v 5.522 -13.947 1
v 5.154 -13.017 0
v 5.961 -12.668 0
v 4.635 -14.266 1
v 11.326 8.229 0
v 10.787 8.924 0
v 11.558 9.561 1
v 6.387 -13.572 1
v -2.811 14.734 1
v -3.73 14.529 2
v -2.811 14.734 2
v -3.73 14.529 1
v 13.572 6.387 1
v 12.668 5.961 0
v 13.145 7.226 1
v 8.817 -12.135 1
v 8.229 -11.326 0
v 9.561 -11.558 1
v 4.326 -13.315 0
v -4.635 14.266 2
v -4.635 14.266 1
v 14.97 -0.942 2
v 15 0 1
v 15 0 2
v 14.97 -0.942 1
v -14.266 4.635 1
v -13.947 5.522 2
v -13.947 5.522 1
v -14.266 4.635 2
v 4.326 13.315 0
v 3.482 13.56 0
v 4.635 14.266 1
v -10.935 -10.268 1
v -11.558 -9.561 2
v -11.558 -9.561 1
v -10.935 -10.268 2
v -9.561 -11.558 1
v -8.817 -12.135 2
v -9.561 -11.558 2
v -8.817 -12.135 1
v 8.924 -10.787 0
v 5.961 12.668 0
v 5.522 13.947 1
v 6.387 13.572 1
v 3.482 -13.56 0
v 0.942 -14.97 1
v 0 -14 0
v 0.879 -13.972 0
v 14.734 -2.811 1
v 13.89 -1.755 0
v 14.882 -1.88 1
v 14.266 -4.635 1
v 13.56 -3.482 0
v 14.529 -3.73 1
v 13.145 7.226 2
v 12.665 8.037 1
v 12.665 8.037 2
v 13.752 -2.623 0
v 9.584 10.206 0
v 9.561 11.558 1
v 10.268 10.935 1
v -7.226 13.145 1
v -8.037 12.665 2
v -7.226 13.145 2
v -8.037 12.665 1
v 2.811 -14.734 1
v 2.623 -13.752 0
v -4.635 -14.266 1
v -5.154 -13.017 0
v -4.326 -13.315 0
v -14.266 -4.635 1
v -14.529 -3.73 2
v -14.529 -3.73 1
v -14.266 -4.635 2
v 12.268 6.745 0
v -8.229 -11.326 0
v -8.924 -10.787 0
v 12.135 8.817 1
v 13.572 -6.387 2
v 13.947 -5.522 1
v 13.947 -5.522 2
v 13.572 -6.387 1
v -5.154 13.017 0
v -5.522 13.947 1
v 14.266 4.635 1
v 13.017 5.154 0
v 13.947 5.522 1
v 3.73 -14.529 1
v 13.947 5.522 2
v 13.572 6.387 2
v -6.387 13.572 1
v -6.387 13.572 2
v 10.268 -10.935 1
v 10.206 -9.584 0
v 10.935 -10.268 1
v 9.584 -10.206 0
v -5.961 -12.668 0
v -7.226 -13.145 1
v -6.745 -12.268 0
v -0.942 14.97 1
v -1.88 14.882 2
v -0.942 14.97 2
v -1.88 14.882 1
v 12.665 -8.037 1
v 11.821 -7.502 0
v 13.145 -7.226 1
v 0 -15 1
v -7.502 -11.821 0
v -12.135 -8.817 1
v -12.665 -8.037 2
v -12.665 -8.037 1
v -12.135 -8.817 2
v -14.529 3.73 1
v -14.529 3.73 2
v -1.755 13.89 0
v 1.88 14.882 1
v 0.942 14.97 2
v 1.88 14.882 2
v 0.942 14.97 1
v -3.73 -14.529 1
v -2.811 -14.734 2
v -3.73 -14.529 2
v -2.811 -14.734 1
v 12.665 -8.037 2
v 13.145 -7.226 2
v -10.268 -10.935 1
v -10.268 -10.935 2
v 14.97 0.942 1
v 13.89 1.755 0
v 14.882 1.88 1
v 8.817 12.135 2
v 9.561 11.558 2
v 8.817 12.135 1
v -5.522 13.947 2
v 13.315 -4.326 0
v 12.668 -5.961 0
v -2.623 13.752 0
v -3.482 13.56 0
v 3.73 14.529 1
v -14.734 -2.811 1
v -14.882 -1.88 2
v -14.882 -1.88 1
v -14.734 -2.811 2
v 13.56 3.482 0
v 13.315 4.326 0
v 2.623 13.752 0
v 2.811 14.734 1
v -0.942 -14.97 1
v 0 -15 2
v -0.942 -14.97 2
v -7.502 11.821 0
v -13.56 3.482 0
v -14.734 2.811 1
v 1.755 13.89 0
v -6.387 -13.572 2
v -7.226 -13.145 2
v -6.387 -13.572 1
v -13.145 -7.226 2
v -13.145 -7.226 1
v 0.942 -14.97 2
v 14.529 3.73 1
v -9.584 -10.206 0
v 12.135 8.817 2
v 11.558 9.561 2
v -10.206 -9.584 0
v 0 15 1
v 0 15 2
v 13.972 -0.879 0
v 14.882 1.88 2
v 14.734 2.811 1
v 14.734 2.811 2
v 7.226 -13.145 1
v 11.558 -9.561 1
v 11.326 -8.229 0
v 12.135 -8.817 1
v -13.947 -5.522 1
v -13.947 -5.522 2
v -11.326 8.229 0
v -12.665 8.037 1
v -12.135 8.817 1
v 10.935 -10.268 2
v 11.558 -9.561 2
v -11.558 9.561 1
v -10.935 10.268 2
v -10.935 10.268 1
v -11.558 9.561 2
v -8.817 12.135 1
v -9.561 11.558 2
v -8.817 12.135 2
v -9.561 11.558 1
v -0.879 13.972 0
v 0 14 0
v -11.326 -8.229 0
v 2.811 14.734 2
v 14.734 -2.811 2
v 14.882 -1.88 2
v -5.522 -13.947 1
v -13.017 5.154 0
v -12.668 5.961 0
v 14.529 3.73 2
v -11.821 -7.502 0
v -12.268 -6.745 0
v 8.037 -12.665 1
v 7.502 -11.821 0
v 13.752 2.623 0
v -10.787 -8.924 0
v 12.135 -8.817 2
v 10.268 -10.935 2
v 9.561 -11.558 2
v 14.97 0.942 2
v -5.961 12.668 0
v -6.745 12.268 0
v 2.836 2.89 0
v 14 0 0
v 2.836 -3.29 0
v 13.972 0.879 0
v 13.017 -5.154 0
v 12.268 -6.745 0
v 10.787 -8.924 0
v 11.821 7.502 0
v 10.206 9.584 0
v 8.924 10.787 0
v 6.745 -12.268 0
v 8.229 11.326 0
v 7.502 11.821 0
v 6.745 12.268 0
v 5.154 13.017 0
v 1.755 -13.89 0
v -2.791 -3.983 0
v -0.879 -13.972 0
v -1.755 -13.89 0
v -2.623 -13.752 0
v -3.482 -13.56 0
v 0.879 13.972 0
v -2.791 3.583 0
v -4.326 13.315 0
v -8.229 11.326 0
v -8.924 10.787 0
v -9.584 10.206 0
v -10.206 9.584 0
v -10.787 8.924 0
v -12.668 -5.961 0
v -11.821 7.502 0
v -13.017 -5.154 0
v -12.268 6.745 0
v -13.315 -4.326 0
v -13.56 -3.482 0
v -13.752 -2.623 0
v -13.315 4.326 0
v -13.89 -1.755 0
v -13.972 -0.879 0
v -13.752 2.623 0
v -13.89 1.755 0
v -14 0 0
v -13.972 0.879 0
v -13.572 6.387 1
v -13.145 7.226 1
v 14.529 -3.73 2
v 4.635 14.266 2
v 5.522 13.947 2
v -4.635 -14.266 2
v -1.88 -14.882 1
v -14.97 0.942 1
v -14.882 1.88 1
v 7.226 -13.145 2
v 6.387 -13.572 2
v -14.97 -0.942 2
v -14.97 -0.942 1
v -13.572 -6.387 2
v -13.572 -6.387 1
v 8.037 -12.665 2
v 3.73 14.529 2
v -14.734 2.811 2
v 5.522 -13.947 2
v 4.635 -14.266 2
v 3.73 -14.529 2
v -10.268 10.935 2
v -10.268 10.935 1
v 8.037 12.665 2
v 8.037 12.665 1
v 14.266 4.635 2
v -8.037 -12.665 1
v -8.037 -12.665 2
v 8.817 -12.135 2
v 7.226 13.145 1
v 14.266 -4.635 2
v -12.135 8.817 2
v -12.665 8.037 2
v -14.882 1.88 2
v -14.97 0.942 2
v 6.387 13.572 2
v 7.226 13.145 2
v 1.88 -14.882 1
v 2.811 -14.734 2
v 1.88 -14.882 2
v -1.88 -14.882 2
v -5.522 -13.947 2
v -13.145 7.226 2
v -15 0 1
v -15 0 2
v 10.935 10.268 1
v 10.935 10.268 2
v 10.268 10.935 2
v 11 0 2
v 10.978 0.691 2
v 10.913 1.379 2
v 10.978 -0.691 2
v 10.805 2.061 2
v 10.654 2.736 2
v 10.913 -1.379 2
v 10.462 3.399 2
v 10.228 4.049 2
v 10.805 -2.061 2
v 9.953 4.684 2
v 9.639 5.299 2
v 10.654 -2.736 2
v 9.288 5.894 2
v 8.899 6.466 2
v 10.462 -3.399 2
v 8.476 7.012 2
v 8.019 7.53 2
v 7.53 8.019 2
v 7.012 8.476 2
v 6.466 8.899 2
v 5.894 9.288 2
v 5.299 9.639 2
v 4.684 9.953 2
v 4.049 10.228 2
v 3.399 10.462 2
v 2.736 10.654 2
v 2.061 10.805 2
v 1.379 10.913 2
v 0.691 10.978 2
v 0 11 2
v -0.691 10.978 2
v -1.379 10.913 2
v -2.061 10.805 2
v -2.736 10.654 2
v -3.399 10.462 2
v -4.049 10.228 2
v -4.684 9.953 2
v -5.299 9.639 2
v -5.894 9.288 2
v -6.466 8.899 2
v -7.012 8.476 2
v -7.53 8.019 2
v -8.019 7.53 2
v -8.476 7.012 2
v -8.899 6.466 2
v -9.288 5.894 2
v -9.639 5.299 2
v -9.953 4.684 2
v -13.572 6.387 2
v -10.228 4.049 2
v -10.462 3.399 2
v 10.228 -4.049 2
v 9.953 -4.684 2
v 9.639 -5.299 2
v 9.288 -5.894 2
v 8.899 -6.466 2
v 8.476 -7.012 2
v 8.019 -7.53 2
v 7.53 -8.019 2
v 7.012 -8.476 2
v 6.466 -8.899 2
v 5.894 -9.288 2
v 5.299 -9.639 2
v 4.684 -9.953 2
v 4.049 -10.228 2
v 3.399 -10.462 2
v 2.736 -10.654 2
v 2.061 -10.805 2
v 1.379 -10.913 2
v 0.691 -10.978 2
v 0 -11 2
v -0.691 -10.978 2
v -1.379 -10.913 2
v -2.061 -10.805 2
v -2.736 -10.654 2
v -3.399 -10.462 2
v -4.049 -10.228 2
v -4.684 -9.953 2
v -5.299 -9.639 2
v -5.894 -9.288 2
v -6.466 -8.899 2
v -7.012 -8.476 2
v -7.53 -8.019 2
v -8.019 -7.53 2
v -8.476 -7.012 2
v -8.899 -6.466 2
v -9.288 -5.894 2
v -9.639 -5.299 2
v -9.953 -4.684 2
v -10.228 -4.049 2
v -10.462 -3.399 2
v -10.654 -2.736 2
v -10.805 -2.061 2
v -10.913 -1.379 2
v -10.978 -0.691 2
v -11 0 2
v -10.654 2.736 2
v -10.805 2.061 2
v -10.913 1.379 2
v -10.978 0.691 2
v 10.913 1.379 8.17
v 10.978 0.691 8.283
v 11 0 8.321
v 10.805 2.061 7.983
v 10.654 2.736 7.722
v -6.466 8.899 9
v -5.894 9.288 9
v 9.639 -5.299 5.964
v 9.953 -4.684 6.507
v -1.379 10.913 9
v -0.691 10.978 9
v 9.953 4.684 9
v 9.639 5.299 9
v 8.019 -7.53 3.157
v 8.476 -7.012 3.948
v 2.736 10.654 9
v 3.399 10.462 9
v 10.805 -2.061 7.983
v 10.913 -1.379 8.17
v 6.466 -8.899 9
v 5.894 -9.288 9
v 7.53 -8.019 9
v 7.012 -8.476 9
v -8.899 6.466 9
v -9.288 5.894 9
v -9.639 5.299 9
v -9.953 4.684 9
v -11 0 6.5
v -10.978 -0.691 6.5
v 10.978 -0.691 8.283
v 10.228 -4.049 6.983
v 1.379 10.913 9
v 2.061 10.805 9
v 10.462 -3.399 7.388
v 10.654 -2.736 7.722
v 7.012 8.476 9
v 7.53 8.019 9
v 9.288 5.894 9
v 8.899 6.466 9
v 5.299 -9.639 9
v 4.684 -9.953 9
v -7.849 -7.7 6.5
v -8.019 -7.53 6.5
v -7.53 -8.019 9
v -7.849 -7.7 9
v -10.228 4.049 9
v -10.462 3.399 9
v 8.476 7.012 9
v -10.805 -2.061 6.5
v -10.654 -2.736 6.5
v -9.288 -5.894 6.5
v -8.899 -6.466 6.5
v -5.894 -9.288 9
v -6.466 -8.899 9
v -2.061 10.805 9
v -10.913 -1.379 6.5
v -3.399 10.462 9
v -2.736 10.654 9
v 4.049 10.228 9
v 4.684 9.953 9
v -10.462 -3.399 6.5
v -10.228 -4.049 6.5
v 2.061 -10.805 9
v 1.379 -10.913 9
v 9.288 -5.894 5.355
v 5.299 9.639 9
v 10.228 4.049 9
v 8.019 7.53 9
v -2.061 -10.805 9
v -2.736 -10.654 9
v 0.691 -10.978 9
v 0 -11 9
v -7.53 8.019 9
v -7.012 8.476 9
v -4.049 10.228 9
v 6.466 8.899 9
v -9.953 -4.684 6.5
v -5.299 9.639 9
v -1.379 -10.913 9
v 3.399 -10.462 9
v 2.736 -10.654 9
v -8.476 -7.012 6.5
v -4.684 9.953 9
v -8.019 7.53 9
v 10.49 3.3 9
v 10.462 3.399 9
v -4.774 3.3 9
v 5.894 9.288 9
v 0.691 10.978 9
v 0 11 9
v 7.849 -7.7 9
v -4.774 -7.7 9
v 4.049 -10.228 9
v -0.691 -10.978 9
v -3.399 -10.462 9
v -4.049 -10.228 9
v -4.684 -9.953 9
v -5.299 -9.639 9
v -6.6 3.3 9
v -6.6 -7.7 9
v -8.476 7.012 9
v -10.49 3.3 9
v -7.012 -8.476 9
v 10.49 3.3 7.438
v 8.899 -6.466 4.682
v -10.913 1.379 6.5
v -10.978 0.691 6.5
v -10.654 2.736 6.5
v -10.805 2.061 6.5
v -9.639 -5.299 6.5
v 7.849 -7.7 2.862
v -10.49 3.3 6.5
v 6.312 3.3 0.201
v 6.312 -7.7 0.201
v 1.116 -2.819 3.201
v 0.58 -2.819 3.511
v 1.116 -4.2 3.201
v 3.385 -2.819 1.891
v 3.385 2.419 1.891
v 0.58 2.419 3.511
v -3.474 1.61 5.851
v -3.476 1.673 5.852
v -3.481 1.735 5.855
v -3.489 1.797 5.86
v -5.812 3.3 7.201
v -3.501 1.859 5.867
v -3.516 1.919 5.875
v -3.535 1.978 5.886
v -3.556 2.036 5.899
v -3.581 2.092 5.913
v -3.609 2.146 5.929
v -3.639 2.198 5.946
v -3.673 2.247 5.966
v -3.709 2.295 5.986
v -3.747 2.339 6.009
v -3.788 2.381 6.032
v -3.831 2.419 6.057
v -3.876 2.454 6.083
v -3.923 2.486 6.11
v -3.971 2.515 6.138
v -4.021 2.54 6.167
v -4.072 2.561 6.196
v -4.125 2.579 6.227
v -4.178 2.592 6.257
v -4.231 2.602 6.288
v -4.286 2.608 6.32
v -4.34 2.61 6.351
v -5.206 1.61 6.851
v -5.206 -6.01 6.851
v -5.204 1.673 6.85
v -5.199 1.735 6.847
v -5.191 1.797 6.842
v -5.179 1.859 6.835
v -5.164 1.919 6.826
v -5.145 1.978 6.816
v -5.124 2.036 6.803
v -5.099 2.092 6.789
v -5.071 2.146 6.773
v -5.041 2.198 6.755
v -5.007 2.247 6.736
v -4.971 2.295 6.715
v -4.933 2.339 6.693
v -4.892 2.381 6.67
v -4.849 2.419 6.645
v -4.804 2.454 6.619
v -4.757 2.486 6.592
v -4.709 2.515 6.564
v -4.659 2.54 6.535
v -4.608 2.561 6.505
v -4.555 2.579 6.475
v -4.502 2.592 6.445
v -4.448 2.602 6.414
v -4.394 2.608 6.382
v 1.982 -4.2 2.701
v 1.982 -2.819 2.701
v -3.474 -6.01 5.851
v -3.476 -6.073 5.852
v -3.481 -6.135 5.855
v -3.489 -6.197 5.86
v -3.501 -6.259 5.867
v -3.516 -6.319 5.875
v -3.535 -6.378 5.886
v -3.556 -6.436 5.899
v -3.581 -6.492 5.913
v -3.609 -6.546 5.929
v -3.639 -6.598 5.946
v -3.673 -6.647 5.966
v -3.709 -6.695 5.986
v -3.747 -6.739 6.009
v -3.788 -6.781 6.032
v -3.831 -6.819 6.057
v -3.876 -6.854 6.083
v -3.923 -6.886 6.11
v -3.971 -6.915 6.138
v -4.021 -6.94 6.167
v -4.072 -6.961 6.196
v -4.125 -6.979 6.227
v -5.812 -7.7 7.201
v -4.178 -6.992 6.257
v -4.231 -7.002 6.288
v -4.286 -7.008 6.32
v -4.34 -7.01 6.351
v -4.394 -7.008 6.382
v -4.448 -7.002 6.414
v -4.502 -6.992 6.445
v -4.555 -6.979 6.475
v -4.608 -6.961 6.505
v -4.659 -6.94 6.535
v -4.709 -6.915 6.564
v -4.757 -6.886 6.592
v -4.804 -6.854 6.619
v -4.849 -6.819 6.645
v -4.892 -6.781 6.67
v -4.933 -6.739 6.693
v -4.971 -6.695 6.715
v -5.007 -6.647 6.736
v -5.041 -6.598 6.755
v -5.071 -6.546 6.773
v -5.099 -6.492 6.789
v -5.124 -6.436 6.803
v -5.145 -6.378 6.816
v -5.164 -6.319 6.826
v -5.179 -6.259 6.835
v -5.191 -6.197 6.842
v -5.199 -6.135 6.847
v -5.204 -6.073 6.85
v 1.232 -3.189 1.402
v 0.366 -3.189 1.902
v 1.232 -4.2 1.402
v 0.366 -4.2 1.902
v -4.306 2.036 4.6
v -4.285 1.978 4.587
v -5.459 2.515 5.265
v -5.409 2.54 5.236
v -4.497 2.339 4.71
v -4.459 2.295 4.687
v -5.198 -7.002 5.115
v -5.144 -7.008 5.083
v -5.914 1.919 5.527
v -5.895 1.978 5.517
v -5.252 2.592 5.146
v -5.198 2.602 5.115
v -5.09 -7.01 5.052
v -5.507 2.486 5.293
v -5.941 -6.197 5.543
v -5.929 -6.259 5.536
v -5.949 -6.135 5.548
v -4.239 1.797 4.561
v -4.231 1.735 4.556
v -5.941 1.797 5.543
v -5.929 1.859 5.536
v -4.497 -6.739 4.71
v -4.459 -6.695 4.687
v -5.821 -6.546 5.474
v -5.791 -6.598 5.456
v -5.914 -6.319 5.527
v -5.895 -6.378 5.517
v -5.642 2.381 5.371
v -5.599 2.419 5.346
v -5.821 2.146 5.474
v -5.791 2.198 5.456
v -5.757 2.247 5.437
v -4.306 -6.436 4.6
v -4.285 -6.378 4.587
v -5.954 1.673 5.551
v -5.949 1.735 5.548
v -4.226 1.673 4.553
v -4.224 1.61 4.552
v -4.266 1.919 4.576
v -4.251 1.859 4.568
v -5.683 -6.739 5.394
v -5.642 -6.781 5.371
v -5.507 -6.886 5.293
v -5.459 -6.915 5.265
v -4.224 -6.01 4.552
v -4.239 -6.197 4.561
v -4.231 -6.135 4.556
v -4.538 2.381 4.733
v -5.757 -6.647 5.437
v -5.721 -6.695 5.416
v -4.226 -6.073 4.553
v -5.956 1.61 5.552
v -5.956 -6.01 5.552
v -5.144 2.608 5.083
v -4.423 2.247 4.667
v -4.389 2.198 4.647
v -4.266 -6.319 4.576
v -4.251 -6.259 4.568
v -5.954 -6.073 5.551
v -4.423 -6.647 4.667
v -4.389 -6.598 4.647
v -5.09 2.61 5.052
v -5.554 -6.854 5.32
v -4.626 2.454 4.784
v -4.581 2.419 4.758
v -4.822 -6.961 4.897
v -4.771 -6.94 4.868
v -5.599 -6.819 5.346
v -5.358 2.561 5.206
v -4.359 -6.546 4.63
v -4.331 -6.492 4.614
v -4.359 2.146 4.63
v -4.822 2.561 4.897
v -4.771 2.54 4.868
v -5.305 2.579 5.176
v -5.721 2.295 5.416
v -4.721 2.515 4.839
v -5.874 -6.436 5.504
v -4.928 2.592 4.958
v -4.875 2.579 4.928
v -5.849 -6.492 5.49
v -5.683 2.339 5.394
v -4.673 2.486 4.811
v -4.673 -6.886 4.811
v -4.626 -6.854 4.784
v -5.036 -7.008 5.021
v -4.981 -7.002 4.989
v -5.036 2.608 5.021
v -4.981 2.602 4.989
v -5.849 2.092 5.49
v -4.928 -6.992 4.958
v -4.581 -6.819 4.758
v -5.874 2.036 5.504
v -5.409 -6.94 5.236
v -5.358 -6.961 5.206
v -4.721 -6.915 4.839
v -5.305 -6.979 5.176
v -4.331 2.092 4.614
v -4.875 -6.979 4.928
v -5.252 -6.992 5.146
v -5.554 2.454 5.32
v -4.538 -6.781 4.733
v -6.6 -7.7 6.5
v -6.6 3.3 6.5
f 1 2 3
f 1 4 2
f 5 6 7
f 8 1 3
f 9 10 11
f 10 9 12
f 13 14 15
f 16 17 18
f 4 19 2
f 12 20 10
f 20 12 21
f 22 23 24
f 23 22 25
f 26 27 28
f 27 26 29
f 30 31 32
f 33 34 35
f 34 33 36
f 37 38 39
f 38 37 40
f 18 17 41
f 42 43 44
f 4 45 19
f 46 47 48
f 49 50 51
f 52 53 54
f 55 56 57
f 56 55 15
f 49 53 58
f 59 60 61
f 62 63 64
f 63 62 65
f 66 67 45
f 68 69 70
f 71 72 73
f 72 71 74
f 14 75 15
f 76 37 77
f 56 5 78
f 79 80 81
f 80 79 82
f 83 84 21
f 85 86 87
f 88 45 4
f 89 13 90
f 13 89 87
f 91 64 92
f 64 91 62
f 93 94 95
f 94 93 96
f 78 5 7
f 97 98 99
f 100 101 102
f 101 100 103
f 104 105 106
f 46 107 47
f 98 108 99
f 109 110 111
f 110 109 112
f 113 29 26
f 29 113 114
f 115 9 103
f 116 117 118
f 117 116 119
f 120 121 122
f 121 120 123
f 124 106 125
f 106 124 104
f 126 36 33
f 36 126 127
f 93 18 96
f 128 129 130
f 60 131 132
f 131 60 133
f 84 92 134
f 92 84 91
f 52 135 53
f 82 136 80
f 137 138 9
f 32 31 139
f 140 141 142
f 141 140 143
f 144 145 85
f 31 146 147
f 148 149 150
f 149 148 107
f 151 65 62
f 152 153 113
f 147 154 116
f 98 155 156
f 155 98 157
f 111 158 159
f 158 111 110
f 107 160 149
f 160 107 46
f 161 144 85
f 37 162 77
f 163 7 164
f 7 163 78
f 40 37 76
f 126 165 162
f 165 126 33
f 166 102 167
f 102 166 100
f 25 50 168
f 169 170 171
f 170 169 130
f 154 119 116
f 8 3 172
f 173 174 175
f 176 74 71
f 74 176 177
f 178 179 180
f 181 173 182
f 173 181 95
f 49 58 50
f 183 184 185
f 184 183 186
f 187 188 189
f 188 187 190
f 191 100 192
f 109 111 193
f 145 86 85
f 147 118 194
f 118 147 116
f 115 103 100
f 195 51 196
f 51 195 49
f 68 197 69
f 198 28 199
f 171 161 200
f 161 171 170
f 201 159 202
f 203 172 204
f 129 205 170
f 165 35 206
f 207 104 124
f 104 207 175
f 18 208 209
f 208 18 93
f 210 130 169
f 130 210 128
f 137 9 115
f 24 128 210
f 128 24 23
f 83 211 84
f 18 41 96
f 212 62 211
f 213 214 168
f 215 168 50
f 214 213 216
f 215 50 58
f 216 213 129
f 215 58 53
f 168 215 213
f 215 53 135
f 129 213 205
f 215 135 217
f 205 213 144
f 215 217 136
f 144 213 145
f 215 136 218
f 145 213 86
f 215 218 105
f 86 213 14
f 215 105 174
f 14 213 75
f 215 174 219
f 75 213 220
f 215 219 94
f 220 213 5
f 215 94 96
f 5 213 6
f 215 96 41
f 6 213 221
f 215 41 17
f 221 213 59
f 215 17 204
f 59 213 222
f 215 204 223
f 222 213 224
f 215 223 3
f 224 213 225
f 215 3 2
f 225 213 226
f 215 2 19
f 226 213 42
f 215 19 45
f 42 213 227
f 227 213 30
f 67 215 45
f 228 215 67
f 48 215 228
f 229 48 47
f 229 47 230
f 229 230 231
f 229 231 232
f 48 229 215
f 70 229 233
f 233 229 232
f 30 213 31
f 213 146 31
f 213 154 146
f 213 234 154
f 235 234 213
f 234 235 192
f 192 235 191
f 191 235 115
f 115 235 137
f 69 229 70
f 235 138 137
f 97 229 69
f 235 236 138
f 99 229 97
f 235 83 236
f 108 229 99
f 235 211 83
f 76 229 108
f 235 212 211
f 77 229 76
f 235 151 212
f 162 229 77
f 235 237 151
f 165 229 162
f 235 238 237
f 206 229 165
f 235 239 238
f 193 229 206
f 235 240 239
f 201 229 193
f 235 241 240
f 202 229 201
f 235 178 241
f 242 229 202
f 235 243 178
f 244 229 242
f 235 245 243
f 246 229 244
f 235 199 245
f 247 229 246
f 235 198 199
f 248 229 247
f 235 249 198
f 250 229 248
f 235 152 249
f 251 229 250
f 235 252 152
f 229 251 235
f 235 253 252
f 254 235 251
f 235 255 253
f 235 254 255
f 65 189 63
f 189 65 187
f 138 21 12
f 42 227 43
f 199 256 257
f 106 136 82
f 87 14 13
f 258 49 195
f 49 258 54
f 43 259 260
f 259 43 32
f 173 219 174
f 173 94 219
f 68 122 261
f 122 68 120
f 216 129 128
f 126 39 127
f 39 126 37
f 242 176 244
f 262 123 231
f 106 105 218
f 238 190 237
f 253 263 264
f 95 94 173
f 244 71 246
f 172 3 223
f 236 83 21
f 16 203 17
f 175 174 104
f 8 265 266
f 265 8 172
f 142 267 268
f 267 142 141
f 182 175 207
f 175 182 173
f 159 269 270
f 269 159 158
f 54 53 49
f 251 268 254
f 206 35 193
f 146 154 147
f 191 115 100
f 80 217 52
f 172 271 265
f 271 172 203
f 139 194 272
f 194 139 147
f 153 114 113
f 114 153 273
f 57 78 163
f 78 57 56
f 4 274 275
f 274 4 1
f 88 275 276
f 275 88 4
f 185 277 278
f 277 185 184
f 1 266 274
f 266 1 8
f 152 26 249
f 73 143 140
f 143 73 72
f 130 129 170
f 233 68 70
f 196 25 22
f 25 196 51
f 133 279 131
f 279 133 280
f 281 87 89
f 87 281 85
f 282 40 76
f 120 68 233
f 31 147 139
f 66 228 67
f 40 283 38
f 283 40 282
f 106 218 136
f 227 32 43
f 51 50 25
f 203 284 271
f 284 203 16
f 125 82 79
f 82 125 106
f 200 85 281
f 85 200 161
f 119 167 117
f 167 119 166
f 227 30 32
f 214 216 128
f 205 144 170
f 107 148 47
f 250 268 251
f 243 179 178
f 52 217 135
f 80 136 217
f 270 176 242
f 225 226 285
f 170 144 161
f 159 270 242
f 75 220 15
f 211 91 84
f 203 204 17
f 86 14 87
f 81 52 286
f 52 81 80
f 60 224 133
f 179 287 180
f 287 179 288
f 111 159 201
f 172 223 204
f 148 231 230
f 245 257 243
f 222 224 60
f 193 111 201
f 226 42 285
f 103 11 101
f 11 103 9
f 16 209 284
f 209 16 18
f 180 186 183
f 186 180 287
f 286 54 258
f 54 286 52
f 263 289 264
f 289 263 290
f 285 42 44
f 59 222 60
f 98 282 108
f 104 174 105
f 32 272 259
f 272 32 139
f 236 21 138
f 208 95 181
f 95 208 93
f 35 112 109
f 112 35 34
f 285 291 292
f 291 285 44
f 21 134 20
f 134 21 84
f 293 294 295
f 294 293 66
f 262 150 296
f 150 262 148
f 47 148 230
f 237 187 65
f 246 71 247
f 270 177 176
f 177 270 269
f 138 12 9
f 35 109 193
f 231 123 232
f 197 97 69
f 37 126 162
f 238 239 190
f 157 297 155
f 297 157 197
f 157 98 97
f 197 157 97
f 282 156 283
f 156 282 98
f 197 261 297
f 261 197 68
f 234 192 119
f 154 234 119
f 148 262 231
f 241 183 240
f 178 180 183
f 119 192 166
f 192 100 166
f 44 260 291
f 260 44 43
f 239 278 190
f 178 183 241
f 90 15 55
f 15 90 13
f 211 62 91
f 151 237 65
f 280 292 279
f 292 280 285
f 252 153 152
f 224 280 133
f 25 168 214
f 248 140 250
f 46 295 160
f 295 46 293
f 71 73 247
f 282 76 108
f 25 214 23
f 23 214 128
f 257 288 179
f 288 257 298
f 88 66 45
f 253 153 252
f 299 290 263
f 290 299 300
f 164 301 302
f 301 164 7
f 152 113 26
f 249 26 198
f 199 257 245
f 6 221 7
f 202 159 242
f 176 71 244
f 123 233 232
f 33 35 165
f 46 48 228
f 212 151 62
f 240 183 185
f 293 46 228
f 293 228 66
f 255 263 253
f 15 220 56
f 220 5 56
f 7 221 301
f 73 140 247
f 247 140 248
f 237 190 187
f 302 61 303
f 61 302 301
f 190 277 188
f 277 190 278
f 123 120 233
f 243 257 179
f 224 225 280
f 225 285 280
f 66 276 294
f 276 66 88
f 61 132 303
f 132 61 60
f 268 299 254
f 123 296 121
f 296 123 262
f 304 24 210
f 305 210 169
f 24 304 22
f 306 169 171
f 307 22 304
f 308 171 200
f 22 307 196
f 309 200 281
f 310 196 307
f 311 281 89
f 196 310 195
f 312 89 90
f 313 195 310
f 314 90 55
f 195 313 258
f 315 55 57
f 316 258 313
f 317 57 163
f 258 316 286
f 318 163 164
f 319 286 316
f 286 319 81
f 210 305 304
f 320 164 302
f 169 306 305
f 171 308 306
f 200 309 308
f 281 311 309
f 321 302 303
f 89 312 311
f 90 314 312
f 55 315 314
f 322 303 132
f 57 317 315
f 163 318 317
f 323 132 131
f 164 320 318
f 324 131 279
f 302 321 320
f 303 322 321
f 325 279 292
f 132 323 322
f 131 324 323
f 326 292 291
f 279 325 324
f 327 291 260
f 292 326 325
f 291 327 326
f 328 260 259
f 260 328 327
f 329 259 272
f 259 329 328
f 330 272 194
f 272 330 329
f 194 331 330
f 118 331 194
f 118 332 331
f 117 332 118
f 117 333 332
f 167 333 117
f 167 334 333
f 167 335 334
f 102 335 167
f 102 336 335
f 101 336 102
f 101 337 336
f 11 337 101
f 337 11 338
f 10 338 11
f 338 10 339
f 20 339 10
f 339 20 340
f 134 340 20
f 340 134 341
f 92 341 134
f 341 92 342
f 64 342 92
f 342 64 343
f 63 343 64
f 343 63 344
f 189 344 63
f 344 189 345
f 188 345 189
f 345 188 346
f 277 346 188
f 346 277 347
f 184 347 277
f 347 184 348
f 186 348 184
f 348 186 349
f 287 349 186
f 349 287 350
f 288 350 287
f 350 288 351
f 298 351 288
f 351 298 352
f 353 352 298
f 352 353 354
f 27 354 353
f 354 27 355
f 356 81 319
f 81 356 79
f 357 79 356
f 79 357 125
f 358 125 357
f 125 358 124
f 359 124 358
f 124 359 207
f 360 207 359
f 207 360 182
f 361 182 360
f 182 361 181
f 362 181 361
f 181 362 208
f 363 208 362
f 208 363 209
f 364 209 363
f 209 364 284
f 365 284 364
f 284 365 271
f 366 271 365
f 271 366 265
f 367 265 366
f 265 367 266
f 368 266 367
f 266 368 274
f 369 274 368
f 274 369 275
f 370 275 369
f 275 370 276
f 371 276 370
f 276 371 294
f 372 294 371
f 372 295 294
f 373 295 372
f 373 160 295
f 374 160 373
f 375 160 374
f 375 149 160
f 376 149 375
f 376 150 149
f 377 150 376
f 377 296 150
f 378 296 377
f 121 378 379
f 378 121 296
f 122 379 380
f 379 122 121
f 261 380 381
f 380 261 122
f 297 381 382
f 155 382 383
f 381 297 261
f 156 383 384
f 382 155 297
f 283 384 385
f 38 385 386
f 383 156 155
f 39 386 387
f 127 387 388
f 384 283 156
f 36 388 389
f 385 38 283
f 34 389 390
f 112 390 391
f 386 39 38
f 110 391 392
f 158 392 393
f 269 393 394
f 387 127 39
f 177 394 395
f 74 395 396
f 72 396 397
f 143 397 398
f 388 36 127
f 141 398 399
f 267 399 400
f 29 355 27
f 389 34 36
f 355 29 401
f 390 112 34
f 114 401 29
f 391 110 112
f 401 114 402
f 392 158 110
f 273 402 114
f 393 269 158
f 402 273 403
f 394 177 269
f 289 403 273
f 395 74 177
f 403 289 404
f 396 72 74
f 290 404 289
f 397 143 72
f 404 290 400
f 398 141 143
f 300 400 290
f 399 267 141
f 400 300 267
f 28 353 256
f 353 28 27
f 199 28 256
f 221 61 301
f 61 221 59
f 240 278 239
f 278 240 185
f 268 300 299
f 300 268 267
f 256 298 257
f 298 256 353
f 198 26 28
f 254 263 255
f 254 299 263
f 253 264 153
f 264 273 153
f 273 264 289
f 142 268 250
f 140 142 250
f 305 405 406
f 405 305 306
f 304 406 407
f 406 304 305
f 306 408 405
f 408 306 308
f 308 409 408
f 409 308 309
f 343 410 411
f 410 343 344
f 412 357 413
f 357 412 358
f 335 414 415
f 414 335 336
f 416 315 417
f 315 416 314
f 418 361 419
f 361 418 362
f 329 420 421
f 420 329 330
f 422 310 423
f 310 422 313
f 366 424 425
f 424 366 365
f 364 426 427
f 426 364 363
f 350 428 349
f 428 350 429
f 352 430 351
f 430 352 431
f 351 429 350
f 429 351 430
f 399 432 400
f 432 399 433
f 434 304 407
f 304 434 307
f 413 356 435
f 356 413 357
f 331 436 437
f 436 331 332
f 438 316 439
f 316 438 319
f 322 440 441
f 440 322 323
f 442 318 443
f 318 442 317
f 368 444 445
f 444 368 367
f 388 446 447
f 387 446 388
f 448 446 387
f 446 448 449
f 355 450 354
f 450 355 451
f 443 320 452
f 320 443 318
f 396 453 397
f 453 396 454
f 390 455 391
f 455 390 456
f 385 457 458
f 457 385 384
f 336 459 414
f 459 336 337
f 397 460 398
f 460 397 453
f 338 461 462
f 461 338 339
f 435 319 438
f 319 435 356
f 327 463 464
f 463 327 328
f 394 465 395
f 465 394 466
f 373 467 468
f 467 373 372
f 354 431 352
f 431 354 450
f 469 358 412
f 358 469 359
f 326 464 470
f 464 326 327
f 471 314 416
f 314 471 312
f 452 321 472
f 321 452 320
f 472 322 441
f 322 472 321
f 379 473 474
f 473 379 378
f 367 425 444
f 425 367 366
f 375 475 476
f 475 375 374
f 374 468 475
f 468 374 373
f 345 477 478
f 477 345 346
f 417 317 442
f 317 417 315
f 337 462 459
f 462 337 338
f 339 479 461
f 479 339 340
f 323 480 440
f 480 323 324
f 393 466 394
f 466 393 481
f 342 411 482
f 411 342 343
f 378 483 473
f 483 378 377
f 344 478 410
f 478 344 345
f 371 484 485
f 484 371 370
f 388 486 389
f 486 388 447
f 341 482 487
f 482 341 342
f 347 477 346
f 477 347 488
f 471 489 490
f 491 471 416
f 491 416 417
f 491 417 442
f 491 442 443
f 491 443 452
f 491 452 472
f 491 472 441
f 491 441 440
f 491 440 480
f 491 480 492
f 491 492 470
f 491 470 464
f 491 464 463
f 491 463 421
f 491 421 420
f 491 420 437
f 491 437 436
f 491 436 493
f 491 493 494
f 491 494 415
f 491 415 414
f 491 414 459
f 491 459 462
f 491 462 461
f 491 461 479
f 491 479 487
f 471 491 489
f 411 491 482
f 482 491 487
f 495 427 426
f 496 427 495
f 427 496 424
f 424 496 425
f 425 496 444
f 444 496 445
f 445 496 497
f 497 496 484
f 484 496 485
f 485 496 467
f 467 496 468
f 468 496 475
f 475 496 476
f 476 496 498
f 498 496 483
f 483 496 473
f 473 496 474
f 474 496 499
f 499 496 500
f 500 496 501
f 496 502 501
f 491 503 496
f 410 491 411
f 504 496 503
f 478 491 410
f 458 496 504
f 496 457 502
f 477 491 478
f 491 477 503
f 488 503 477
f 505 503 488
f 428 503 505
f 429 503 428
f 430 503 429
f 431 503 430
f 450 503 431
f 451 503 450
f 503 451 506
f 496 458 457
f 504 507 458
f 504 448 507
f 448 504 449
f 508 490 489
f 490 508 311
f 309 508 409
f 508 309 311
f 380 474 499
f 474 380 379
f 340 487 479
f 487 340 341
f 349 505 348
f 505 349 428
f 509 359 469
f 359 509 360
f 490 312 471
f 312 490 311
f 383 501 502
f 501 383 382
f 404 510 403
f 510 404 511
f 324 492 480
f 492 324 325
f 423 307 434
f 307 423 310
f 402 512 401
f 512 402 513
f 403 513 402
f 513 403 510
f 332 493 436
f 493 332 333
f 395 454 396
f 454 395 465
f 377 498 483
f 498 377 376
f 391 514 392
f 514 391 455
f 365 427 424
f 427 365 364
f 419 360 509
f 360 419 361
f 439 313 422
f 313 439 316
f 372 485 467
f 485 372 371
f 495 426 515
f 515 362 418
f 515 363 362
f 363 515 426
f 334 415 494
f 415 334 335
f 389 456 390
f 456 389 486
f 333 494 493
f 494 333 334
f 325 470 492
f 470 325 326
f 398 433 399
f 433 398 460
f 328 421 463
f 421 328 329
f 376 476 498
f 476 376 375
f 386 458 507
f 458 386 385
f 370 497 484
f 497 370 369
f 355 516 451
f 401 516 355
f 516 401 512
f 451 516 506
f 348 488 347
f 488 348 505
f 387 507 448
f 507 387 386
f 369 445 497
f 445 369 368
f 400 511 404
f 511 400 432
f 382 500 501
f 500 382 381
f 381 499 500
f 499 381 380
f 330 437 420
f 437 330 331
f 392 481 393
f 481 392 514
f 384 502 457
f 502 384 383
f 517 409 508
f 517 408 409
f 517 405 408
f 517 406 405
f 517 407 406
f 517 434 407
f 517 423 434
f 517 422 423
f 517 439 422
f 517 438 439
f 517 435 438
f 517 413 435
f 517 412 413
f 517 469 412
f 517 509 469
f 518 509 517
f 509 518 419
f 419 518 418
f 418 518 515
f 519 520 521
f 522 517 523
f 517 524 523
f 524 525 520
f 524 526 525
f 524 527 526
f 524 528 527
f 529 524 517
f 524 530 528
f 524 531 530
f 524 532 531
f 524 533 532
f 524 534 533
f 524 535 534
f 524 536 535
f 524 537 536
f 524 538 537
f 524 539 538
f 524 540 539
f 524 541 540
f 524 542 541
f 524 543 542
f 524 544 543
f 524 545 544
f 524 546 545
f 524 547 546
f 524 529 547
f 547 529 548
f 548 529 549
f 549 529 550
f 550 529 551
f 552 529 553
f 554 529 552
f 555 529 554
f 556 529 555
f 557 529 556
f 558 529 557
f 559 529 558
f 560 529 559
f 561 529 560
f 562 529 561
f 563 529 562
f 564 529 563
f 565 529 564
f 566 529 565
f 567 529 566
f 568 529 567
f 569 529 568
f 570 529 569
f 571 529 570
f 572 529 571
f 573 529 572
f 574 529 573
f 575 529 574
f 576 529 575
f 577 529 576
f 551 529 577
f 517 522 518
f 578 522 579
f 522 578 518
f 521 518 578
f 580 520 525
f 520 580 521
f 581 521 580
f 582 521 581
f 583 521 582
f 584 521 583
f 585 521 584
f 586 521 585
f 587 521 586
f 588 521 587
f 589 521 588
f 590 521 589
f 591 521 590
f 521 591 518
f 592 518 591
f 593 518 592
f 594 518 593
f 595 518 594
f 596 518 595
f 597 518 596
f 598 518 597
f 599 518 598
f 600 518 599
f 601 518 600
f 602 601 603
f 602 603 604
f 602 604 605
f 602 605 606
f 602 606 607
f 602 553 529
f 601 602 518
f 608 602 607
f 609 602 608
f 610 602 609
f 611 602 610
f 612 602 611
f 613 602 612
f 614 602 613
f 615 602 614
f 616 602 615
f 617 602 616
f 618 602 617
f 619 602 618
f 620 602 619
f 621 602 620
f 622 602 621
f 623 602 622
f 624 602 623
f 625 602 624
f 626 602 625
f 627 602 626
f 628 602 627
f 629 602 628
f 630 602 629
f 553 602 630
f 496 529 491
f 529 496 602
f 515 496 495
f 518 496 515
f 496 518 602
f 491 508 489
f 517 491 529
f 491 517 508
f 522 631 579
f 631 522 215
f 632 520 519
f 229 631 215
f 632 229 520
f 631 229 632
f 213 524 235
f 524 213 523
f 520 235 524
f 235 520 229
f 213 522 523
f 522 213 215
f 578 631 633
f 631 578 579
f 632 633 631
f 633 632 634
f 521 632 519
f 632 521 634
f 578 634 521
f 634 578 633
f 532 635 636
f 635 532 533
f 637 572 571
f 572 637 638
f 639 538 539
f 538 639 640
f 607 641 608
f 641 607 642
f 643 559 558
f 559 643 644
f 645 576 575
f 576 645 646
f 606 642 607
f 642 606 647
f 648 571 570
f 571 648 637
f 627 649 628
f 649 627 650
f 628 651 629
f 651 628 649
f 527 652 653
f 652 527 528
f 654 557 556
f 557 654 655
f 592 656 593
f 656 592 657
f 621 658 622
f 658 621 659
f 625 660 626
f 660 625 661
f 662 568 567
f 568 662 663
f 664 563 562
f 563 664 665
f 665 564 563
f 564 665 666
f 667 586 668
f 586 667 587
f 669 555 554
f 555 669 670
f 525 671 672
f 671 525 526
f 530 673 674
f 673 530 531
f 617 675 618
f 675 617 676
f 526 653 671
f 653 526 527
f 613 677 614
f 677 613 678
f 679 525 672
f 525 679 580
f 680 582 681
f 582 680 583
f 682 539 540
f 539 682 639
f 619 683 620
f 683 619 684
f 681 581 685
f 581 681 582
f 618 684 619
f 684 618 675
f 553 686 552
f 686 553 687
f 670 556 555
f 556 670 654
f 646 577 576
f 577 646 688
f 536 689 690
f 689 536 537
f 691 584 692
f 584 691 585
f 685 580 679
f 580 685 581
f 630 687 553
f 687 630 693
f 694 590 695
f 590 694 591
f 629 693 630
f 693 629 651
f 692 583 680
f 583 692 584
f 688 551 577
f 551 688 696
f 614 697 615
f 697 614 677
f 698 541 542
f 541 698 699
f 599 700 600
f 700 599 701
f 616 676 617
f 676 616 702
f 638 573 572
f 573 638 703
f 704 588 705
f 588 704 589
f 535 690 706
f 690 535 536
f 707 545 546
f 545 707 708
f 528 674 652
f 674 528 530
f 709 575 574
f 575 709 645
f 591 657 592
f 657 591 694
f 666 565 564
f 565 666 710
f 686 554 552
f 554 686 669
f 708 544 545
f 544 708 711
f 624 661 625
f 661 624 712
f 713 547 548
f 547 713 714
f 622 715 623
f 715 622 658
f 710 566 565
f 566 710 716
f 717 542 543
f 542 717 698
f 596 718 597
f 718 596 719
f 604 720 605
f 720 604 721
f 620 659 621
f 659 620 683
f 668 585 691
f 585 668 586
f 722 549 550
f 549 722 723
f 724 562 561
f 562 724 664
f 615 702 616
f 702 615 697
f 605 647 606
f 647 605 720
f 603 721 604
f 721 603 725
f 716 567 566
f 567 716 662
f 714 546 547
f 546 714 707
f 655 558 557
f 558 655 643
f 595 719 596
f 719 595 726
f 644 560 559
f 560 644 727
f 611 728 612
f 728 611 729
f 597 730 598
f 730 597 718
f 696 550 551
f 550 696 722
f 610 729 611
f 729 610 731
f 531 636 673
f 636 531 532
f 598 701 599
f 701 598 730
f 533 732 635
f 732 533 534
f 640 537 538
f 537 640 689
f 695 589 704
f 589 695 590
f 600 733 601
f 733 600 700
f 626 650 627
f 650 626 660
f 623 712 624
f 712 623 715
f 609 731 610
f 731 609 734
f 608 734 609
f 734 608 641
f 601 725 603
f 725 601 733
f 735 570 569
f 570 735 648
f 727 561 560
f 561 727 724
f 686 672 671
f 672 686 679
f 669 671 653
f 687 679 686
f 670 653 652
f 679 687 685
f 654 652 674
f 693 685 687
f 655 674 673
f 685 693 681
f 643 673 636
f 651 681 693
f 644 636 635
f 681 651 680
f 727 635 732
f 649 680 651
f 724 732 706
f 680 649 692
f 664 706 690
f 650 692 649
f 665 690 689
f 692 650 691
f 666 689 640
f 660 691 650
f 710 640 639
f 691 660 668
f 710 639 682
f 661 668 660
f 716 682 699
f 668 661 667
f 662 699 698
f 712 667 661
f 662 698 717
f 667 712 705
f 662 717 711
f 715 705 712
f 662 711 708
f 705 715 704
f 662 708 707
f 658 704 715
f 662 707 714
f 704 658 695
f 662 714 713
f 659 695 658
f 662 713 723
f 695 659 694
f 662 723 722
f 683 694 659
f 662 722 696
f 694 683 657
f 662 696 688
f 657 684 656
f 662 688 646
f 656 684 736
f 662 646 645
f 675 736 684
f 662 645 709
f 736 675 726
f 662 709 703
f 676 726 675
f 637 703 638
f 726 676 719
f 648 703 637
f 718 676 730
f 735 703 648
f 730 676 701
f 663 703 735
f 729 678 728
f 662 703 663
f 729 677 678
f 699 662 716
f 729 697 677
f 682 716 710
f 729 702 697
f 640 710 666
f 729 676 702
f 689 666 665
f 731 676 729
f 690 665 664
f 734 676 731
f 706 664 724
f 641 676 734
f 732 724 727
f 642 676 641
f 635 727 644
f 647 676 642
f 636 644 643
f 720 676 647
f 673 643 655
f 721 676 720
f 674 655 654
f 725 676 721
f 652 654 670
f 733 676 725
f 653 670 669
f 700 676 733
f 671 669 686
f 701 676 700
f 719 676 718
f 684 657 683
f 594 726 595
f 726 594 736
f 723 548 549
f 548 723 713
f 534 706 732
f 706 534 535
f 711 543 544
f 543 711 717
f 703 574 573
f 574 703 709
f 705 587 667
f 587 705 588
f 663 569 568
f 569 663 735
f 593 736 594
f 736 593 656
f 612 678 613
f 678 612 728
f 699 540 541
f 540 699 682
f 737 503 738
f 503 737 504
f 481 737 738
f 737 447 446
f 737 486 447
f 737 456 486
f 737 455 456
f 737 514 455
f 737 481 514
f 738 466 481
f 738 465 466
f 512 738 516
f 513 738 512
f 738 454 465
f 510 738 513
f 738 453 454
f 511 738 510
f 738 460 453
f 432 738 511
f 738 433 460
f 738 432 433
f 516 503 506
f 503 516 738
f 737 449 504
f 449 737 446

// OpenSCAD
// file: vl53l0x.scad
// VL53L0X template


module vl53l0x(front=true,back=true)
{
    a=30; // spec says 25 degrees
    e=100;
    pw=14; // Size of PCB
    ph=11;
    pt=1.5;
    // PCB
    t=(back?e:pt);
    translate([-pw/2,-ph/2,pt-t])
    cube([pw,ph,t]);
    // sensor
    sw=2.5; // Size of sensor
    sh=4.5;
    st=1.5;
    sx=9;
    sy=3.5;
    w2=sw+e*sin(a);
    h2=sh+e*sin(a);
    hull()
    {
        translate([sx-pw/2-sw/2,sy-ph/2-sh/2,0])
        cube([sw,sh,pt+t]);
        if(front)
            translate([sx-pw/2-w2/2,sy-ph/2-h2/2,st+e])
            cube([w2,h2,t]);
    }
    // cap
    cw=1;
    ch=2;
    cx=8.5;
    cy=6.5;
    ct=1.5;
    translate([cx-pw/2-cw/2,cy-ph/2-ch/2,0])
    cube([cw,ch,pt+ct]);
    // back
    bw=8;
    bh=9;
    bt=1.5;
    bx=7;
    by=5.5;
    translate([bx-pw/2-bw/2,by-ph/2-bh/2,-bt])
    cube([bw,bh,bt]);
    wx=1.7;
    wy=(ph-3*2.54)/2;
    wt=3+pt;
    wd=2;
    hull($fn=100)
    {
        translate([wx-pw/2,ph/2-wy,pt/2-wt/2])
        cylinder(d=wd,h=wt);
        translate([wx-pw/2,wy-ph/2,pt/2-wt/2])
        cylinder(d=wd,h=wt);
    }
}

vl53l0x(false,false);
// main file
// Exit plug

use <vl53l0x.scad>

d=22;
d0=30;
t=2;
t0=2;
t1=5;
s=1;

$fn=100;

difference()
{
    union()
    {
        hull()
        {
            cylinder(d=d0-s*2,h=t0);
            translate([0,0,s])
            cylinder(d=d0,h=t0-s);
        }
        cylinder(d=d,h=t0+t+t1);
    }
    translate([1,-2.2,5])
    {
        rotate([180,30,0])
        {
            vl53l0x(25,60);
            #vl53l0x(false,false); // Shows location
        }
        translate([-17.6,-5.5,1.5])
        cube([10,11,10]);
    }
}
